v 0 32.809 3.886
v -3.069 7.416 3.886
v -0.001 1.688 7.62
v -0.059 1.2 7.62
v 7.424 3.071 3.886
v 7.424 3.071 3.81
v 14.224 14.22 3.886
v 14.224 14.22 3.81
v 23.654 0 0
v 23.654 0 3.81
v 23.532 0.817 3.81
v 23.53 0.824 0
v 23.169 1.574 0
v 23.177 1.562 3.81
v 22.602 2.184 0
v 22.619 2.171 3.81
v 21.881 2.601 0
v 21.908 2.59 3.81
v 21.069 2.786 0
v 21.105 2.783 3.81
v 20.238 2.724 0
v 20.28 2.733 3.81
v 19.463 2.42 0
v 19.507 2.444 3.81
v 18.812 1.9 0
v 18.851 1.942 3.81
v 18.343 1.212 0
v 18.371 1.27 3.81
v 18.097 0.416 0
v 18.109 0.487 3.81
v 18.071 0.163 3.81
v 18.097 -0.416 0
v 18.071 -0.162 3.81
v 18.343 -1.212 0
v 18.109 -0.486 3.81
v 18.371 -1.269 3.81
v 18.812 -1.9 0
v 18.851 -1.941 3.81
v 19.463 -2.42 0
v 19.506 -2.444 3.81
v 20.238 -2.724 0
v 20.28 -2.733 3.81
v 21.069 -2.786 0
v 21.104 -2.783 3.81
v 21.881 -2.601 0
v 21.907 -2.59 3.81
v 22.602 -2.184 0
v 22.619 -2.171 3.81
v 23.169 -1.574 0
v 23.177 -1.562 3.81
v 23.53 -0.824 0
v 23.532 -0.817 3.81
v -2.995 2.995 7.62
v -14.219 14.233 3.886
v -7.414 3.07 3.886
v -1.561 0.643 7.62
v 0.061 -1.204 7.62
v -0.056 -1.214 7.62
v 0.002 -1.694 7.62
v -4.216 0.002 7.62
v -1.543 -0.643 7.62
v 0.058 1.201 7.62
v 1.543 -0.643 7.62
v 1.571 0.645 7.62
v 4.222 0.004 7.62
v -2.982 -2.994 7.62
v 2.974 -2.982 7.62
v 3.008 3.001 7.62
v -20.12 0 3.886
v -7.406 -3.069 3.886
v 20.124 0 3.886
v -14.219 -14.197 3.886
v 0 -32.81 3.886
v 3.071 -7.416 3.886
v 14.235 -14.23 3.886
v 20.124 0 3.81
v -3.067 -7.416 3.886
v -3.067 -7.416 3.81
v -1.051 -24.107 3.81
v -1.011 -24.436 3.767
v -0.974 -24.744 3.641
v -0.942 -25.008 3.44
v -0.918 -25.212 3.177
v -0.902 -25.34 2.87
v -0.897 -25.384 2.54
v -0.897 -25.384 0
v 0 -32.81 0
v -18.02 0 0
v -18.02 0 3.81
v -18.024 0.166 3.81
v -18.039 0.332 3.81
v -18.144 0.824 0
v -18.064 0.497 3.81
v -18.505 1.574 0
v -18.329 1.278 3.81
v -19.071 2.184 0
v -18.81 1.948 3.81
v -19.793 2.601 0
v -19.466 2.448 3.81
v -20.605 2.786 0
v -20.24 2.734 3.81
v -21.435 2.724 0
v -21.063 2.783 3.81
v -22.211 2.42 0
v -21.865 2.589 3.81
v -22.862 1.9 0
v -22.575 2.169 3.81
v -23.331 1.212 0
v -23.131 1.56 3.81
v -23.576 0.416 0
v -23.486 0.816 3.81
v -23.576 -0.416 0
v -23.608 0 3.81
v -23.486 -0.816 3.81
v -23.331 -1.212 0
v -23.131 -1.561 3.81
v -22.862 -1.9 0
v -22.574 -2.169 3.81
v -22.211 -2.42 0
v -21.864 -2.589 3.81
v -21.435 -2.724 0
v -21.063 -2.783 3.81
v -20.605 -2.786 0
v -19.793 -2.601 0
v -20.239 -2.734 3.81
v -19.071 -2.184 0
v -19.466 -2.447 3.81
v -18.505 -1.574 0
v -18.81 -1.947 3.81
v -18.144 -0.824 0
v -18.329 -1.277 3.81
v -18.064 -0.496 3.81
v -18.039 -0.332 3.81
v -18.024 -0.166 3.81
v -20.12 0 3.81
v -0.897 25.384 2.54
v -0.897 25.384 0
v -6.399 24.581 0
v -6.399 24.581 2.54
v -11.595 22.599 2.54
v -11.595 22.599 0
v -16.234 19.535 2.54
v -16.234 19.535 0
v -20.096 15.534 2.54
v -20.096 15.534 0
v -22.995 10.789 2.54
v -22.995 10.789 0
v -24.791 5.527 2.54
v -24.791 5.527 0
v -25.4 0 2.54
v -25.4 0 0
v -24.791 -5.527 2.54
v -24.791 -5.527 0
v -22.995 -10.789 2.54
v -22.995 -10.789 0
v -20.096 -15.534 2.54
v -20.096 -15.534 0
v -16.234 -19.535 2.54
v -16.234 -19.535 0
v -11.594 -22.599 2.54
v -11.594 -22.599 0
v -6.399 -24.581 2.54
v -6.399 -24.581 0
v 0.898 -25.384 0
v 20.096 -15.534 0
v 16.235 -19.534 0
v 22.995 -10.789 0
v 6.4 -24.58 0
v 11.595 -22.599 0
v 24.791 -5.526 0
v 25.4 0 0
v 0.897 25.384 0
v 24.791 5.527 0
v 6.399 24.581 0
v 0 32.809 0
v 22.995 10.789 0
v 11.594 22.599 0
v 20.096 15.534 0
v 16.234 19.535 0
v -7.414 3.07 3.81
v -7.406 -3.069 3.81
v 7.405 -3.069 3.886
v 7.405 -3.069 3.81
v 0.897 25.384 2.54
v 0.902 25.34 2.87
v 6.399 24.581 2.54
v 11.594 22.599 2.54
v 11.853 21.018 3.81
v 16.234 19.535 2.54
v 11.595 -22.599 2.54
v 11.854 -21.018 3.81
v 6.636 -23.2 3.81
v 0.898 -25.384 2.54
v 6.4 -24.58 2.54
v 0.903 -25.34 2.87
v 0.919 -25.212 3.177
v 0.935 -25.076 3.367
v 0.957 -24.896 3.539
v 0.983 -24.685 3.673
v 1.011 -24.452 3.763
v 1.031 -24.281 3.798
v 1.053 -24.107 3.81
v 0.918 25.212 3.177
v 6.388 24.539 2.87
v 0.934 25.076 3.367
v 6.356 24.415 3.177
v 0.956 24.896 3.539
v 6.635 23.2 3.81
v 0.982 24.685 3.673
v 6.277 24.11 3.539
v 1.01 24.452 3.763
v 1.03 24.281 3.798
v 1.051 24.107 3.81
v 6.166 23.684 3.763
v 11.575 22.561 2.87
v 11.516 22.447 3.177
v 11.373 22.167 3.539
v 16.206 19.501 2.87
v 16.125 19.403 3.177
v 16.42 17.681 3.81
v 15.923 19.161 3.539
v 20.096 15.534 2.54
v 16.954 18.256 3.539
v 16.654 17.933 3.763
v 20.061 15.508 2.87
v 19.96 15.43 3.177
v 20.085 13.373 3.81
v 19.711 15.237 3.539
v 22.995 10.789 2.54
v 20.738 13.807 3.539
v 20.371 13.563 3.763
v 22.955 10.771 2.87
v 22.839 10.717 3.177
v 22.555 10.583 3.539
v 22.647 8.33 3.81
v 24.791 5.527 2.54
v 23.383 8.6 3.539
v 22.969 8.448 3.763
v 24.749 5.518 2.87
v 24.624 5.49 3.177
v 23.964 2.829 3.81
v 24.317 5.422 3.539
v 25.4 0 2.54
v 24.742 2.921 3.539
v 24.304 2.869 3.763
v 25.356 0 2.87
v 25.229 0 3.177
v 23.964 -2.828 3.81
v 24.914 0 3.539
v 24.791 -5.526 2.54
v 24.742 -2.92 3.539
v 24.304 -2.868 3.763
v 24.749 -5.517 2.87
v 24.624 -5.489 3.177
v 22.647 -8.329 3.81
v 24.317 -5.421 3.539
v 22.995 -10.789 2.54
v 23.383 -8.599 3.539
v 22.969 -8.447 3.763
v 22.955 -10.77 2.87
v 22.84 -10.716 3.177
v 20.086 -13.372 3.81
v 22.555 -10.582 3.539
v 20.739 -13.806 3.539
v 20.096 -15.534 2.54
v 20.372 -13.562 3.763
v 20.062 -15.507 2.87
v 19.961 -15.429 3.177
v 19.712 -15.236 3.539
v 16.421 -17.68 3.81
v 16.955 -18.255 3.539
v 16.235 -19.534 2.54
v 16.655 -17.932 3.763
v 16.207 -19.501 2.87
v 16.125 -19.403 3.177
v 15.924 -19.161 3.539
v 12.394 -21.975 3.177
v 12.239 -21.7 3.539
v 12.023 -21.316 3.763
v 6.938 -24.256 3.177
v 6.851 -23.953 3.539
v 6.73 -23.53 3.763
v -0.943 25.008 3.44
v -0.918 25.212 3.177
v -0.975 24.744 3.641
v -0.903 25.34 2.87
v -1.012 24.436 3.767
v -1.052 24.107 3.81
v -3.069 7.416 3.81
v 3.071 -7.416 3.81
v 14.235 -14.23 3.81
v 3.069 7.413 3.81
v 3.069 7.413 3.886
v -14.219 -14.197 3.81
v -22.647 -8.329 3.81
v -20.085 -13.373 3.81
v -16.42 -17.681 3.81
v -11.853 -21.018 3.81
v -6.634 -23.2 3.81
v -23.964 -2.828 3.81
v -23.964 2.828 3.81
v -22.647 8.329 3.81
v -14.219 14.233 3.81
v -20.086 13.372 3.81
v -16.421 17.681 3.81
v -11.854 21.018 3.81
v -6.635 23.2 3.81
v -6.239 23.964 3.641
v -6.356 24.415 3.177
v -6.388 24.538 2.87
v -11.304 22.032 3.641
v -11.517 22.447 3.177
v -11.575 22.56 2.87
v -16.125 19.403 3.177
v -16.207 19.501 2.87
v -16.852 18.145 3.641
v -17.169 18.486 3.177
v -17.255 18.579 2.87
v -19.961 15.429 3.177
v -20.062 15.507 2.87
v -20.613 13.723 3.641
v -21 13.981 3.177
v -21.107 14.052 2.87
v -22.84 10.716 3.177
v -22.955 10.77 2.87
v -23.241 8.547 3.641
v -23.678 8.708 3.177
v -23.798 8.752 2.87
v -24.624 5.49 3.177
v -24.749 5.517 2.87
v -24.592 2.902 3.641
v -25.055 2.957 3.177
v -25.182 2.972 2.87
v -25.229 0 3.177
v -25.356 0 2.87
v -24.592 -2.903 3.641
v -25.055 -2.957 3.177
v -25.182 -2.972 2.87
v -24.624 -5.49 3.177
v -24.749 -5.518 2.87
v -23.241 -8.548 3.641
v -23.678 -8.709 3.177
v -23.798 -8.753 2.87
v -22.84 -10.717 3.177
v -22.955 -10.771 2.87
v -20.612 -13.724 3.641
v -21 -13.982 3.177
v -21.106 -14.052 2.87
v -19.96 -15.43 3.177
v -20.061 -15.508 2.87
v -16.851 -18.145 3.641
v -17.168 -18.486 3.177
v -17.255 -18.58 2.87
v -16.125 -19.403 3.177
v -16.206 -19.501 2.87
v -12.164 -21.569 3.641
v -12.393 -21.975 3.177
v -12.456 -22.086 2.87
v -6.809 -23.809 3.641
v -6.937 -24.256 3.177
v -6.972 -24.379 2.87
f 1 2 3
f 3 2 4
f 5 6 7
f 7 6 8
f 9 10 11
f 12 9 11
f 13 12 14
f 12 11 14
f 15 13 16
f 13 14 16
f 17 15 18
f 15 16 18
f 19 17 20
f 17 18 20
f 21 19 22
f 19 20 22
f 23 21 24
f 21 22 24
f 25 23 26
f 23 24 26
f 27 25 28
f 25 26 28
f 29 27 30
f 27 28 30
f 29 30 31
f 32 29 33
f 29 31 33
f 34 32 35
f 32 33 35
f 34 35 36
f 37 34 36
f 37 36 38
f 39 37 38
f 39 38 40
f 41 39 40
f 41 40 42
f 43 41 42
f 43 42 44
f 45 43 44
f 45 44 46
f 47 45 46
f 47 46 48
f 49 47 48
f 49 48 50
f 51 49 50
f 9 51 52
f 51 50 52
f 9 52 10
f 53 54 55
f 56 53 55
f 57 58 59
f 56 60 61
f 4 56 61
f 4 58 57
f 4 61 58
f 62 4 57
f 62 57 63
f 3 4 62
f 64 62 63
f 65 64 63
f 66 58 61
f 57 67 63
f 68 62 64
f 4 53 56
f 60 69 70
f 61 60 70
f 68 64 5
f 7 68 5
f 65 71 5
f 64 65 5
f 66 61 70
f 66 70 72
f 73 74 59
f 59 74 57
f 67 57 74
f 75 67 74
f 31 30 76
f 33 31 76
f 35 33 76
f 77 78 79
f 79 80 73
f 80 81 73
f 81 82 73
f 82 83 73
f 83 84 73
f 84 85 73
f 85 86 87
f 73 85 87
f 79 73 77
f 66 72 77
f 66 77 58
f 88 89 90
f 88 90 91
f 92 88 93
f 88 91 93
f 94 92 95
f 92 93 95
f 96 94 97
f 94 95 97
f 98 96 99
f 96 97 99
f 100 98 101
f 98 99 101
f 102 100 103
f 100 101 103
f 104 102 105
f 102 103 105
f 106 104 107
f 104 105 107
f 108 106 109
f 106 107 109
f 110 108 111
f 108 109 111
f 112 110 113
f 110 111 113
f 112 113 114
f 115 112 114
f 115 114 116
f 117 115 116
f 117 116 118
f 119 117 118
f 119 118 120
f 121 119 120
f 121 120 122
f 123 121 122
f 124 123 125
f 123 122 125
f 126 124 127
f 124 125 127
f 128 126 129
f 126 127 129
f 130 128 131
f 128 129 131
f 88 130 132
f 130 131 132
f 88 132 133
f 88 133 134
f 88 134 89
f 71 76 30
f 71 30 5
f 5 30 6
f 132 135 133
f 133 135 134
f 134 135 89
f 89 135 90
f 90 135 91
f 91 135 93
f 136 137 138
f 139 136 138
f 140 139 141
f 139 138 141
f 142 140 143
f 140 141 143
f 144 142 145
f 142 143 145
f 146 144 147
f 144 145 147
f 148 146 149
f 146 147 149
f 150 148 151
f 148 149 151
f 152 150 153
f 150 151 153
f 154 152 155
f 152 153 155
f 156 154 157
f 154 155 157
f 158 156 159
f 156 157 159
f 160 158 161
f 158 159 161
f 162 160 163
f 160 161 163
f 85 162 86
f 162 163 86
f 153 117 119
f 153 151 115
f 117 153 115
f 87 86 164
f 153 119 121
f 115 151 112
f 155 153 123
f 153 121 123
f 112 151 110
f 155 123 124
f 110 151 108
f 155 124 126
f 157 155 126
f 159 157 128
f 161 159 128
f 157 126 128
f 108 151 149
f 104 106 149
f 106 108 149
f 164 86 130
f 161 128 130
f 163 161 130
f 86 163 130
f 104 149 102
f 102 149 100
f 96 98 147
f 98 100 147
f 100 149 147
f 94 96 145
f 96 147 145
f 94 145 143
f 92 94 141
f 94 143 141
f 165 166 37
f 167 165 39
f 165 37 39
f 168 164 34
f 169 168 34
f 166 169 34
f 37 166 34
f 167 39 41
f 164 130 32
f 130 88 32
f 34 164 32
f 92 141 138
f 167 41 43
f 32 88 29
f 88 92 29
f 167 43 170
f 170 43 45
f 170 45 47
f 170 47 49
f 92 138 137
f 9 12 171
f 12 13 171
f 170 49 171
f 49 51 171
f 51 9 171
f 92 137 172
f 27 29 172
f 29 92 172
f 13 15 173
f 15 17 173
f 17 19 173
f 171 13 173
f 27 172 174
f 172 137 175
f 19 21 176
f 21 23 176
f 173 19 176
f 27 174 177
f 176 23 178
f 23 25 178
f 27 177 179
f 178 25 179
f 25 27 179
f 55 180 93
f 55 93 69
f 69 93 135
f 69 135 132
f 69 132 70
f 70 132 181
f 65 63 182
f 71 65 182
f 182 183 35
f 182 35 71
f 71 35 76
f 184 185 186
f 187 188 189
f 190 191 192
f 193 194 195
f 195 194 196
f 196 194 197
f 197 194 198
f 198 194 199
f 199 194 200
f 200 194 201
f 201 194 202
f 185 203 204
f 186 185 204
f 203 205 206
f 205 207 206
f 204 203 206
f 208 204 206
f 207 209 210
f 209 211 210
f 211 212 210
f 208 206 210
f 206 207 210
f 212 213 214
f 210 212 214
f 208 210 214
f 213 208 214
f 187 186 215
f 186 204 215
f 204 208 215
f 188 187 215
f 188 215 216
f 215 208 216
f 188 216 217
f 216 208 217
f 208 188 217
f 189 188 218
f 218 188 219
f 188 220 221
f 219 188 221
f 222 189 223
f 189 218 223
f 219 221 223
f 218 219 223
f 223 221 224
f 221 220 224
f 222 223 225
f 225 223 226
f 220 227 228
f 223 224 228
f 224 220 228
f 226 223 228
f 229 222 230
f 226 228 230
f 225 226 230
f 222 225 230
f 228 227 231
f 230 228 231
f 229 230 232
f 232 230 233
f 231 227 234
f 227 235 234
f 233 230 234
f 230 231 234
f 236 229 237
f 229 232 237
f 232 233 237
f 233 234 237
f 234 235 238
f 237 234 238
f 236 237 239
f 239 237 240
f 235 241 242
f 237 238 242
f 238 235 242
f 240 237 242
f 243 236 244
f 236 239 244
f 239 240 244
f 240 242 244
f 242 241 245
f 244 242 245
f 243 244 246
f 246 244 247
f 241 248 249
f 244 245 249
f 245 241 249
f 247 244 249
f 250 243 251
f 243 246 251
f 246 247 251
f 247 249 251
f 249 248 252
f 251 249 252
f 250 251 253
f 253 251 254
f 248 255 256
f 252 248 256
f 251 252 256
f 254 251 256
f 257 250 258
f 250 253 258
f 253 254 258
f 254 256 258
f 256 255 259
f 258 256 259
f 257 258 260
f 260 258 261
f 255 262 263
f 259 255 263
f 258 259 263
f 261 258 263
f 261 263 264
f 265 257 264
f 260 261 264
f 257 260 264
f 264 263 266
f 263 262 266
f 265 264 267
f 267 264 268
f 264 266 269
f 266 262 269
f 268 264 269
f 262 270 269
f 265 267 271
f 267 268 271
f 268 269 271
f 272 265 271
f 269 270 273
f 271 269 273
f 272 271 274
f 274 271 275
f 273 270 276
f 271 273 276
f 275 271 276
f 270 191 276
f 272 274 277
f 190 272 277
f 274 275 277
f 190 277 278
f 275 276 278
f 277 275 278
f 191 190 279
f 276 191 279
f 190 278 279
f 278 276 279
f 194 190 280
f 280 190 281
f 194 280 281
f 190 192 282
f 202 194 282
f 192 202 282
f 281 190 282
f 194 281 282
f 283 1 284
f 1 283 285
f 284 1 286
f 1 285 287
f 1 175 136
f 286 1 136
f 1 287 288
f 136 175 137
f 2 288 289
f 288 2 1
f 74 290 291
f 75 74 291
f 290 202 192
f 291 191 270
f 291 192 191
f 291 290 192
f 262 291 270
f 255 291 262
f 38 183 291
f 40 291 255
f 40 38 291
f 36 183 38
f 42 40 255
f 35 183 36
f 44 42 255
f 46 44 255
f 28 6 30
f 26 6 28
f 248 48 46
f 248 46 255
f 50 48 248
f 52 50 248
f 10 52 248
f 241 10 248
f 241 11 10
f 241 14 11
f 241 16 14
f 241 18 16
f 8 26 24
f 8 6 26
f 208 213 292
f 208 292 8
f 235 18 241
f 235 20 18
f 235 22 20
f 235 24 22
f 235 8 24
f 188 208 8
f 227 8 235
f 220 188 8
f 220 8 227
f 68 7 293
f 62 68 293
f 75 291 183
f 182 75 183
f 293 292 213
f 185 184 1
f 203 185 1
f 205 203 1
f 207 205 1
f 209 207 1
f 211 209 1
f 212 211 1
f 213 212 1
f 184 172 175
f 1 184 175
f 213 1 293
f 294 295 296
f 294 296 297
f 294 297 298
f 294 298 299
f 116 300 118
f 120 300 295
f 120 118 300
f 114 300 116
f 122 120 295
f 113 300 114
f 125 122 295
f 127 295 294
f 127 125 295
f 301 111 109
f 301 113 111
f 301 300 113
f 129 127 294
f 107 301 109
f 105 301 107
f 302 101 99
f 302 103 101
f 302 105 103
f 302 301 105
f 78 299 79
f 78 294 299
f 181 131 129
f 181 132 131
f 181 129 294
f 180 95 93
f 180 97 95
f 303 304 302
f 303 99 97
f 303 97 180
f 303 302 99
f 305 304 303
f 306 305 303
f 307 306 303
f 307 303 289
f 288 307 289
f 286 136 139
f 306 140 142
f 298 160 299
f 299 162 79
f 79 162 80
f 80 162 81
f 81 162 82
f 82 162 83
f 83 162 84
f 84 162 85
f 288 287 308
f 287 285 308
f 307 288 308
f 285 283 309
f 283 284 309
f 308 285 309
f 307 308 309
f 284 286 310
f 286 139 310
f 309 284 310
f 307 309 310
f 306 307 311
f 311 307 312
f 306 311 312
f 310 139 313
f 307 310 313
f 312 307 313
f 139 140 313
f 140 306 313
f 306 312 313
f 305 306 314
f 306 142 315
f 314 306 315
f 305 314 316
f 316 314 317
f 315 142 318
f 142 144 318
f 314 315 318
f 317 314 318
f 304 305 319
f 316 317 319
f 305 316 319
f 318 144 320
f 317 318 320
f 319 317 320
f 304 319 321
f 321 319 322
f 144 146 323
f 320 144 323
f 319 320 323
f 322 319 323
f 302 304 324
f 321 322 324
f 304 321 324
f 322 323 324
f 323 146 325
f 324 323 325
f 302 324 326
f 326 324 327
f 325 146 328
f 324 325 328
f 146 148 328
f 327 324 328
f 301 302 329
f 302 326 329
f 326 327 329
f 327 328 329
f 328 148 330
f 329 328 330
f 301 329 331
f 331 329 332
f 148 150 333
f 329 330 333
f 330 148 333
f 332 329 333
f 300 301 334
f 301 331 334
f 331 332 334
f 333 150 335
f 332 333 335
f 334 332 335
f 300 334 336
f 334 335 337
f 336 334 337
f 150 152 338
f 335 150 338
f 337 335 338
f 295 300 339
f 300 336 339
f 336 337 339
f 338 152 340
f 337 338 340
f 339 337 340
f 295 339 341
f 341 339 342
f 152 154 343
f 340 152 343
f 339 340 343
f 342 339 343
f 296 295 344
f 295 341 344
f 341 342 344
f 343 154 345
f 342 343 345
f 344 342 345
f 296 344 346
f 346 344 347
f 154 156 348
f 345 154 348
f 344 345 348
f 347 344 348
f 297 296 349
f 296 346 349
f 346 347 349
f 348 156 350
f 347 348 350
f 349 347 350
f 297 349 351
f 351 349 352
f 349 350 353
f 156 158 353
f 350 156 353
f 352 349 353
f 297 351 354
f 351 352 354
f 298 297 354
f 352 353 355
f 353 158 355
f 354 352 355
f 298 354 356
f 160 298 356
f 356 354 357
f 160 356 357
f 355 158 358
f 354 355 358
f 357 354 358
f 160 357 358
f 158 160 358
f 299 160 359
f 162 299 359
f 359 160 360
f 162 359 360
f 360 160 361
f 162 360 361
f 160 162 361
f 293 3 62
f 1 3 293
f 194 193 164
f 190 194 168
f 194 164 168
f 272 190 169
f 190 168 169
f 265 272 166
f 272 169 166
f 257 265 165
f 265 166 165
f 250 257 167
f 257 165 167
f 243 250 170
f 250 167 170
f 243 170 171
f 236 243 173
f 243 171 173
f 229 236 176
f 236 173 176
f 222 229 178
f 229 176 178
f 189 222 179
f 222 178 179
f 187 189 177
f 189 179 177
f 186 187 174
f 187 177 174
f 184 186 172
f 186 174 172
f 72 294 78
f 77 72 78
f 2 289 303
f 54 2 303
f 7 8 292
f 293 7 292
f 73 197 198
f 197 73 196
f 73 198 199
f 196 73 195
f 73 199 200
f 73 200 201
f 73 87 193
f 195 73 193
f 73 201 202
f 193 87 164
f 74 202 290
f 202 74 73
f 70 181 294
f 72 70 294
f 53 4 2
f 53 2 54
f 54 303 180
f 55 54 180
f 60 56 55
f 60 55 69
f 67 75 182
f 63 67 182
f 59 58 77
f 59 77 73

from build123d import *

# Parameters (mm, degrees)
F2_DEPTH = 7.62
F3_R     = 25.4
F4_DEPTH = 3.81
F5_SIZE  = 3.7338
F6_R     = 1.27
F9_D     = 5.588
F9_DEPTH = 127
F9_TIP   = 1.6788045696


with BuildPart() as f2:
    # F1 (on Top) → F2 (new body)
    with BuildSketch(Plane.XY):
        Polygon((-3.0674997251, -7.4159256183), (0, -32.8098908067), (3.0712168664, -7.4155884795), (14.2346806824, -14.2299178988), (7.4049378745, -3.0691174325), (20.1237425208, 0), (7.4238278903, 3.0710902065), (14.2239863053, 14.2202461138), (3.068682272, 7.4126794934), (0, 32.8086838126), (-3.0691300053, 7.4164932594), (-14.2189133912, 14.2328040674), (-7.413723506, 3.0703686643), (-20.1198514551, 0), (-7.4060442857, -3.0691174325), (-14.2189133912, -14.1971036792), align=None)
    extrude(amount=F2_DEPTH)

    # F3 (on Top) → F4 (join)
    with BuildSketch(Plane.XY):
        Circle(F3_R)
    extrude(amount=F4_DEPTH)

    # F5
    f5_edges = [f2.edges().sort_by_distance(p)[0] for p in [
        (-10.812479, -8.633111, 7.62),
        (-8.643207, -10.806515, 7.62),
        (-1.53375, -20.112908, 7.62),
        (1.535608, -20.11274, 7.62),
        (8.652949, -10.822753, 7.62),
        (10.819809, -8.649518, 7.62),
        (13.76434, -1.534559, 7.62),
        (13.773785, 1.535545, 7.62),
        (10.823907, 8.645668, 7.62),
        (8.646334, 10.816463, 7.62),
        (1.534341, 20.110682, 7.62),
        (-1.534565, 20.112589, 7.62),
        (-8.644022, 10.824649, 7.62),
        (-10.816318, 8.651586, 7.62),
        (-13.766787, 1.535184, 7.62),
        (-13.762948, -1.534559, 7.62),
    ]]
    chamfer(f5_edges, length=F5_SIZE)

    # F6
    f6_edges = [f2.edges().sort_by_distance(p)[0] for p in [
        (25.4, 0.000476, 3.81),
        (-25.4, -0.000198, 3.81),
    ]]
    fillet(f6_edges, radius=F6_R)

    # F9 (one way)
    with BuildSketch(Plane.XY.offset(3.81)):
        with Locations((-20.8135005087, 0), (20.8601150662, 0)):
            Circle(F9_D / 2)
    extrude(amount=-F9_DEPTH, mode=Mode.SUBTRACT)
    with Locations(Plane.XY.offset(3.81)):
        with Locations((-20.8135005087, 0), (20.8601150662, 0)):
            with Locations((0, 0, -(F9_DEPTH + F9_TIP / 2))):  # 118° drill point
                Cone(0, F9_D / 2, F9_TIP, mode=Mode.SUBTRACT)


solid = f2.part
